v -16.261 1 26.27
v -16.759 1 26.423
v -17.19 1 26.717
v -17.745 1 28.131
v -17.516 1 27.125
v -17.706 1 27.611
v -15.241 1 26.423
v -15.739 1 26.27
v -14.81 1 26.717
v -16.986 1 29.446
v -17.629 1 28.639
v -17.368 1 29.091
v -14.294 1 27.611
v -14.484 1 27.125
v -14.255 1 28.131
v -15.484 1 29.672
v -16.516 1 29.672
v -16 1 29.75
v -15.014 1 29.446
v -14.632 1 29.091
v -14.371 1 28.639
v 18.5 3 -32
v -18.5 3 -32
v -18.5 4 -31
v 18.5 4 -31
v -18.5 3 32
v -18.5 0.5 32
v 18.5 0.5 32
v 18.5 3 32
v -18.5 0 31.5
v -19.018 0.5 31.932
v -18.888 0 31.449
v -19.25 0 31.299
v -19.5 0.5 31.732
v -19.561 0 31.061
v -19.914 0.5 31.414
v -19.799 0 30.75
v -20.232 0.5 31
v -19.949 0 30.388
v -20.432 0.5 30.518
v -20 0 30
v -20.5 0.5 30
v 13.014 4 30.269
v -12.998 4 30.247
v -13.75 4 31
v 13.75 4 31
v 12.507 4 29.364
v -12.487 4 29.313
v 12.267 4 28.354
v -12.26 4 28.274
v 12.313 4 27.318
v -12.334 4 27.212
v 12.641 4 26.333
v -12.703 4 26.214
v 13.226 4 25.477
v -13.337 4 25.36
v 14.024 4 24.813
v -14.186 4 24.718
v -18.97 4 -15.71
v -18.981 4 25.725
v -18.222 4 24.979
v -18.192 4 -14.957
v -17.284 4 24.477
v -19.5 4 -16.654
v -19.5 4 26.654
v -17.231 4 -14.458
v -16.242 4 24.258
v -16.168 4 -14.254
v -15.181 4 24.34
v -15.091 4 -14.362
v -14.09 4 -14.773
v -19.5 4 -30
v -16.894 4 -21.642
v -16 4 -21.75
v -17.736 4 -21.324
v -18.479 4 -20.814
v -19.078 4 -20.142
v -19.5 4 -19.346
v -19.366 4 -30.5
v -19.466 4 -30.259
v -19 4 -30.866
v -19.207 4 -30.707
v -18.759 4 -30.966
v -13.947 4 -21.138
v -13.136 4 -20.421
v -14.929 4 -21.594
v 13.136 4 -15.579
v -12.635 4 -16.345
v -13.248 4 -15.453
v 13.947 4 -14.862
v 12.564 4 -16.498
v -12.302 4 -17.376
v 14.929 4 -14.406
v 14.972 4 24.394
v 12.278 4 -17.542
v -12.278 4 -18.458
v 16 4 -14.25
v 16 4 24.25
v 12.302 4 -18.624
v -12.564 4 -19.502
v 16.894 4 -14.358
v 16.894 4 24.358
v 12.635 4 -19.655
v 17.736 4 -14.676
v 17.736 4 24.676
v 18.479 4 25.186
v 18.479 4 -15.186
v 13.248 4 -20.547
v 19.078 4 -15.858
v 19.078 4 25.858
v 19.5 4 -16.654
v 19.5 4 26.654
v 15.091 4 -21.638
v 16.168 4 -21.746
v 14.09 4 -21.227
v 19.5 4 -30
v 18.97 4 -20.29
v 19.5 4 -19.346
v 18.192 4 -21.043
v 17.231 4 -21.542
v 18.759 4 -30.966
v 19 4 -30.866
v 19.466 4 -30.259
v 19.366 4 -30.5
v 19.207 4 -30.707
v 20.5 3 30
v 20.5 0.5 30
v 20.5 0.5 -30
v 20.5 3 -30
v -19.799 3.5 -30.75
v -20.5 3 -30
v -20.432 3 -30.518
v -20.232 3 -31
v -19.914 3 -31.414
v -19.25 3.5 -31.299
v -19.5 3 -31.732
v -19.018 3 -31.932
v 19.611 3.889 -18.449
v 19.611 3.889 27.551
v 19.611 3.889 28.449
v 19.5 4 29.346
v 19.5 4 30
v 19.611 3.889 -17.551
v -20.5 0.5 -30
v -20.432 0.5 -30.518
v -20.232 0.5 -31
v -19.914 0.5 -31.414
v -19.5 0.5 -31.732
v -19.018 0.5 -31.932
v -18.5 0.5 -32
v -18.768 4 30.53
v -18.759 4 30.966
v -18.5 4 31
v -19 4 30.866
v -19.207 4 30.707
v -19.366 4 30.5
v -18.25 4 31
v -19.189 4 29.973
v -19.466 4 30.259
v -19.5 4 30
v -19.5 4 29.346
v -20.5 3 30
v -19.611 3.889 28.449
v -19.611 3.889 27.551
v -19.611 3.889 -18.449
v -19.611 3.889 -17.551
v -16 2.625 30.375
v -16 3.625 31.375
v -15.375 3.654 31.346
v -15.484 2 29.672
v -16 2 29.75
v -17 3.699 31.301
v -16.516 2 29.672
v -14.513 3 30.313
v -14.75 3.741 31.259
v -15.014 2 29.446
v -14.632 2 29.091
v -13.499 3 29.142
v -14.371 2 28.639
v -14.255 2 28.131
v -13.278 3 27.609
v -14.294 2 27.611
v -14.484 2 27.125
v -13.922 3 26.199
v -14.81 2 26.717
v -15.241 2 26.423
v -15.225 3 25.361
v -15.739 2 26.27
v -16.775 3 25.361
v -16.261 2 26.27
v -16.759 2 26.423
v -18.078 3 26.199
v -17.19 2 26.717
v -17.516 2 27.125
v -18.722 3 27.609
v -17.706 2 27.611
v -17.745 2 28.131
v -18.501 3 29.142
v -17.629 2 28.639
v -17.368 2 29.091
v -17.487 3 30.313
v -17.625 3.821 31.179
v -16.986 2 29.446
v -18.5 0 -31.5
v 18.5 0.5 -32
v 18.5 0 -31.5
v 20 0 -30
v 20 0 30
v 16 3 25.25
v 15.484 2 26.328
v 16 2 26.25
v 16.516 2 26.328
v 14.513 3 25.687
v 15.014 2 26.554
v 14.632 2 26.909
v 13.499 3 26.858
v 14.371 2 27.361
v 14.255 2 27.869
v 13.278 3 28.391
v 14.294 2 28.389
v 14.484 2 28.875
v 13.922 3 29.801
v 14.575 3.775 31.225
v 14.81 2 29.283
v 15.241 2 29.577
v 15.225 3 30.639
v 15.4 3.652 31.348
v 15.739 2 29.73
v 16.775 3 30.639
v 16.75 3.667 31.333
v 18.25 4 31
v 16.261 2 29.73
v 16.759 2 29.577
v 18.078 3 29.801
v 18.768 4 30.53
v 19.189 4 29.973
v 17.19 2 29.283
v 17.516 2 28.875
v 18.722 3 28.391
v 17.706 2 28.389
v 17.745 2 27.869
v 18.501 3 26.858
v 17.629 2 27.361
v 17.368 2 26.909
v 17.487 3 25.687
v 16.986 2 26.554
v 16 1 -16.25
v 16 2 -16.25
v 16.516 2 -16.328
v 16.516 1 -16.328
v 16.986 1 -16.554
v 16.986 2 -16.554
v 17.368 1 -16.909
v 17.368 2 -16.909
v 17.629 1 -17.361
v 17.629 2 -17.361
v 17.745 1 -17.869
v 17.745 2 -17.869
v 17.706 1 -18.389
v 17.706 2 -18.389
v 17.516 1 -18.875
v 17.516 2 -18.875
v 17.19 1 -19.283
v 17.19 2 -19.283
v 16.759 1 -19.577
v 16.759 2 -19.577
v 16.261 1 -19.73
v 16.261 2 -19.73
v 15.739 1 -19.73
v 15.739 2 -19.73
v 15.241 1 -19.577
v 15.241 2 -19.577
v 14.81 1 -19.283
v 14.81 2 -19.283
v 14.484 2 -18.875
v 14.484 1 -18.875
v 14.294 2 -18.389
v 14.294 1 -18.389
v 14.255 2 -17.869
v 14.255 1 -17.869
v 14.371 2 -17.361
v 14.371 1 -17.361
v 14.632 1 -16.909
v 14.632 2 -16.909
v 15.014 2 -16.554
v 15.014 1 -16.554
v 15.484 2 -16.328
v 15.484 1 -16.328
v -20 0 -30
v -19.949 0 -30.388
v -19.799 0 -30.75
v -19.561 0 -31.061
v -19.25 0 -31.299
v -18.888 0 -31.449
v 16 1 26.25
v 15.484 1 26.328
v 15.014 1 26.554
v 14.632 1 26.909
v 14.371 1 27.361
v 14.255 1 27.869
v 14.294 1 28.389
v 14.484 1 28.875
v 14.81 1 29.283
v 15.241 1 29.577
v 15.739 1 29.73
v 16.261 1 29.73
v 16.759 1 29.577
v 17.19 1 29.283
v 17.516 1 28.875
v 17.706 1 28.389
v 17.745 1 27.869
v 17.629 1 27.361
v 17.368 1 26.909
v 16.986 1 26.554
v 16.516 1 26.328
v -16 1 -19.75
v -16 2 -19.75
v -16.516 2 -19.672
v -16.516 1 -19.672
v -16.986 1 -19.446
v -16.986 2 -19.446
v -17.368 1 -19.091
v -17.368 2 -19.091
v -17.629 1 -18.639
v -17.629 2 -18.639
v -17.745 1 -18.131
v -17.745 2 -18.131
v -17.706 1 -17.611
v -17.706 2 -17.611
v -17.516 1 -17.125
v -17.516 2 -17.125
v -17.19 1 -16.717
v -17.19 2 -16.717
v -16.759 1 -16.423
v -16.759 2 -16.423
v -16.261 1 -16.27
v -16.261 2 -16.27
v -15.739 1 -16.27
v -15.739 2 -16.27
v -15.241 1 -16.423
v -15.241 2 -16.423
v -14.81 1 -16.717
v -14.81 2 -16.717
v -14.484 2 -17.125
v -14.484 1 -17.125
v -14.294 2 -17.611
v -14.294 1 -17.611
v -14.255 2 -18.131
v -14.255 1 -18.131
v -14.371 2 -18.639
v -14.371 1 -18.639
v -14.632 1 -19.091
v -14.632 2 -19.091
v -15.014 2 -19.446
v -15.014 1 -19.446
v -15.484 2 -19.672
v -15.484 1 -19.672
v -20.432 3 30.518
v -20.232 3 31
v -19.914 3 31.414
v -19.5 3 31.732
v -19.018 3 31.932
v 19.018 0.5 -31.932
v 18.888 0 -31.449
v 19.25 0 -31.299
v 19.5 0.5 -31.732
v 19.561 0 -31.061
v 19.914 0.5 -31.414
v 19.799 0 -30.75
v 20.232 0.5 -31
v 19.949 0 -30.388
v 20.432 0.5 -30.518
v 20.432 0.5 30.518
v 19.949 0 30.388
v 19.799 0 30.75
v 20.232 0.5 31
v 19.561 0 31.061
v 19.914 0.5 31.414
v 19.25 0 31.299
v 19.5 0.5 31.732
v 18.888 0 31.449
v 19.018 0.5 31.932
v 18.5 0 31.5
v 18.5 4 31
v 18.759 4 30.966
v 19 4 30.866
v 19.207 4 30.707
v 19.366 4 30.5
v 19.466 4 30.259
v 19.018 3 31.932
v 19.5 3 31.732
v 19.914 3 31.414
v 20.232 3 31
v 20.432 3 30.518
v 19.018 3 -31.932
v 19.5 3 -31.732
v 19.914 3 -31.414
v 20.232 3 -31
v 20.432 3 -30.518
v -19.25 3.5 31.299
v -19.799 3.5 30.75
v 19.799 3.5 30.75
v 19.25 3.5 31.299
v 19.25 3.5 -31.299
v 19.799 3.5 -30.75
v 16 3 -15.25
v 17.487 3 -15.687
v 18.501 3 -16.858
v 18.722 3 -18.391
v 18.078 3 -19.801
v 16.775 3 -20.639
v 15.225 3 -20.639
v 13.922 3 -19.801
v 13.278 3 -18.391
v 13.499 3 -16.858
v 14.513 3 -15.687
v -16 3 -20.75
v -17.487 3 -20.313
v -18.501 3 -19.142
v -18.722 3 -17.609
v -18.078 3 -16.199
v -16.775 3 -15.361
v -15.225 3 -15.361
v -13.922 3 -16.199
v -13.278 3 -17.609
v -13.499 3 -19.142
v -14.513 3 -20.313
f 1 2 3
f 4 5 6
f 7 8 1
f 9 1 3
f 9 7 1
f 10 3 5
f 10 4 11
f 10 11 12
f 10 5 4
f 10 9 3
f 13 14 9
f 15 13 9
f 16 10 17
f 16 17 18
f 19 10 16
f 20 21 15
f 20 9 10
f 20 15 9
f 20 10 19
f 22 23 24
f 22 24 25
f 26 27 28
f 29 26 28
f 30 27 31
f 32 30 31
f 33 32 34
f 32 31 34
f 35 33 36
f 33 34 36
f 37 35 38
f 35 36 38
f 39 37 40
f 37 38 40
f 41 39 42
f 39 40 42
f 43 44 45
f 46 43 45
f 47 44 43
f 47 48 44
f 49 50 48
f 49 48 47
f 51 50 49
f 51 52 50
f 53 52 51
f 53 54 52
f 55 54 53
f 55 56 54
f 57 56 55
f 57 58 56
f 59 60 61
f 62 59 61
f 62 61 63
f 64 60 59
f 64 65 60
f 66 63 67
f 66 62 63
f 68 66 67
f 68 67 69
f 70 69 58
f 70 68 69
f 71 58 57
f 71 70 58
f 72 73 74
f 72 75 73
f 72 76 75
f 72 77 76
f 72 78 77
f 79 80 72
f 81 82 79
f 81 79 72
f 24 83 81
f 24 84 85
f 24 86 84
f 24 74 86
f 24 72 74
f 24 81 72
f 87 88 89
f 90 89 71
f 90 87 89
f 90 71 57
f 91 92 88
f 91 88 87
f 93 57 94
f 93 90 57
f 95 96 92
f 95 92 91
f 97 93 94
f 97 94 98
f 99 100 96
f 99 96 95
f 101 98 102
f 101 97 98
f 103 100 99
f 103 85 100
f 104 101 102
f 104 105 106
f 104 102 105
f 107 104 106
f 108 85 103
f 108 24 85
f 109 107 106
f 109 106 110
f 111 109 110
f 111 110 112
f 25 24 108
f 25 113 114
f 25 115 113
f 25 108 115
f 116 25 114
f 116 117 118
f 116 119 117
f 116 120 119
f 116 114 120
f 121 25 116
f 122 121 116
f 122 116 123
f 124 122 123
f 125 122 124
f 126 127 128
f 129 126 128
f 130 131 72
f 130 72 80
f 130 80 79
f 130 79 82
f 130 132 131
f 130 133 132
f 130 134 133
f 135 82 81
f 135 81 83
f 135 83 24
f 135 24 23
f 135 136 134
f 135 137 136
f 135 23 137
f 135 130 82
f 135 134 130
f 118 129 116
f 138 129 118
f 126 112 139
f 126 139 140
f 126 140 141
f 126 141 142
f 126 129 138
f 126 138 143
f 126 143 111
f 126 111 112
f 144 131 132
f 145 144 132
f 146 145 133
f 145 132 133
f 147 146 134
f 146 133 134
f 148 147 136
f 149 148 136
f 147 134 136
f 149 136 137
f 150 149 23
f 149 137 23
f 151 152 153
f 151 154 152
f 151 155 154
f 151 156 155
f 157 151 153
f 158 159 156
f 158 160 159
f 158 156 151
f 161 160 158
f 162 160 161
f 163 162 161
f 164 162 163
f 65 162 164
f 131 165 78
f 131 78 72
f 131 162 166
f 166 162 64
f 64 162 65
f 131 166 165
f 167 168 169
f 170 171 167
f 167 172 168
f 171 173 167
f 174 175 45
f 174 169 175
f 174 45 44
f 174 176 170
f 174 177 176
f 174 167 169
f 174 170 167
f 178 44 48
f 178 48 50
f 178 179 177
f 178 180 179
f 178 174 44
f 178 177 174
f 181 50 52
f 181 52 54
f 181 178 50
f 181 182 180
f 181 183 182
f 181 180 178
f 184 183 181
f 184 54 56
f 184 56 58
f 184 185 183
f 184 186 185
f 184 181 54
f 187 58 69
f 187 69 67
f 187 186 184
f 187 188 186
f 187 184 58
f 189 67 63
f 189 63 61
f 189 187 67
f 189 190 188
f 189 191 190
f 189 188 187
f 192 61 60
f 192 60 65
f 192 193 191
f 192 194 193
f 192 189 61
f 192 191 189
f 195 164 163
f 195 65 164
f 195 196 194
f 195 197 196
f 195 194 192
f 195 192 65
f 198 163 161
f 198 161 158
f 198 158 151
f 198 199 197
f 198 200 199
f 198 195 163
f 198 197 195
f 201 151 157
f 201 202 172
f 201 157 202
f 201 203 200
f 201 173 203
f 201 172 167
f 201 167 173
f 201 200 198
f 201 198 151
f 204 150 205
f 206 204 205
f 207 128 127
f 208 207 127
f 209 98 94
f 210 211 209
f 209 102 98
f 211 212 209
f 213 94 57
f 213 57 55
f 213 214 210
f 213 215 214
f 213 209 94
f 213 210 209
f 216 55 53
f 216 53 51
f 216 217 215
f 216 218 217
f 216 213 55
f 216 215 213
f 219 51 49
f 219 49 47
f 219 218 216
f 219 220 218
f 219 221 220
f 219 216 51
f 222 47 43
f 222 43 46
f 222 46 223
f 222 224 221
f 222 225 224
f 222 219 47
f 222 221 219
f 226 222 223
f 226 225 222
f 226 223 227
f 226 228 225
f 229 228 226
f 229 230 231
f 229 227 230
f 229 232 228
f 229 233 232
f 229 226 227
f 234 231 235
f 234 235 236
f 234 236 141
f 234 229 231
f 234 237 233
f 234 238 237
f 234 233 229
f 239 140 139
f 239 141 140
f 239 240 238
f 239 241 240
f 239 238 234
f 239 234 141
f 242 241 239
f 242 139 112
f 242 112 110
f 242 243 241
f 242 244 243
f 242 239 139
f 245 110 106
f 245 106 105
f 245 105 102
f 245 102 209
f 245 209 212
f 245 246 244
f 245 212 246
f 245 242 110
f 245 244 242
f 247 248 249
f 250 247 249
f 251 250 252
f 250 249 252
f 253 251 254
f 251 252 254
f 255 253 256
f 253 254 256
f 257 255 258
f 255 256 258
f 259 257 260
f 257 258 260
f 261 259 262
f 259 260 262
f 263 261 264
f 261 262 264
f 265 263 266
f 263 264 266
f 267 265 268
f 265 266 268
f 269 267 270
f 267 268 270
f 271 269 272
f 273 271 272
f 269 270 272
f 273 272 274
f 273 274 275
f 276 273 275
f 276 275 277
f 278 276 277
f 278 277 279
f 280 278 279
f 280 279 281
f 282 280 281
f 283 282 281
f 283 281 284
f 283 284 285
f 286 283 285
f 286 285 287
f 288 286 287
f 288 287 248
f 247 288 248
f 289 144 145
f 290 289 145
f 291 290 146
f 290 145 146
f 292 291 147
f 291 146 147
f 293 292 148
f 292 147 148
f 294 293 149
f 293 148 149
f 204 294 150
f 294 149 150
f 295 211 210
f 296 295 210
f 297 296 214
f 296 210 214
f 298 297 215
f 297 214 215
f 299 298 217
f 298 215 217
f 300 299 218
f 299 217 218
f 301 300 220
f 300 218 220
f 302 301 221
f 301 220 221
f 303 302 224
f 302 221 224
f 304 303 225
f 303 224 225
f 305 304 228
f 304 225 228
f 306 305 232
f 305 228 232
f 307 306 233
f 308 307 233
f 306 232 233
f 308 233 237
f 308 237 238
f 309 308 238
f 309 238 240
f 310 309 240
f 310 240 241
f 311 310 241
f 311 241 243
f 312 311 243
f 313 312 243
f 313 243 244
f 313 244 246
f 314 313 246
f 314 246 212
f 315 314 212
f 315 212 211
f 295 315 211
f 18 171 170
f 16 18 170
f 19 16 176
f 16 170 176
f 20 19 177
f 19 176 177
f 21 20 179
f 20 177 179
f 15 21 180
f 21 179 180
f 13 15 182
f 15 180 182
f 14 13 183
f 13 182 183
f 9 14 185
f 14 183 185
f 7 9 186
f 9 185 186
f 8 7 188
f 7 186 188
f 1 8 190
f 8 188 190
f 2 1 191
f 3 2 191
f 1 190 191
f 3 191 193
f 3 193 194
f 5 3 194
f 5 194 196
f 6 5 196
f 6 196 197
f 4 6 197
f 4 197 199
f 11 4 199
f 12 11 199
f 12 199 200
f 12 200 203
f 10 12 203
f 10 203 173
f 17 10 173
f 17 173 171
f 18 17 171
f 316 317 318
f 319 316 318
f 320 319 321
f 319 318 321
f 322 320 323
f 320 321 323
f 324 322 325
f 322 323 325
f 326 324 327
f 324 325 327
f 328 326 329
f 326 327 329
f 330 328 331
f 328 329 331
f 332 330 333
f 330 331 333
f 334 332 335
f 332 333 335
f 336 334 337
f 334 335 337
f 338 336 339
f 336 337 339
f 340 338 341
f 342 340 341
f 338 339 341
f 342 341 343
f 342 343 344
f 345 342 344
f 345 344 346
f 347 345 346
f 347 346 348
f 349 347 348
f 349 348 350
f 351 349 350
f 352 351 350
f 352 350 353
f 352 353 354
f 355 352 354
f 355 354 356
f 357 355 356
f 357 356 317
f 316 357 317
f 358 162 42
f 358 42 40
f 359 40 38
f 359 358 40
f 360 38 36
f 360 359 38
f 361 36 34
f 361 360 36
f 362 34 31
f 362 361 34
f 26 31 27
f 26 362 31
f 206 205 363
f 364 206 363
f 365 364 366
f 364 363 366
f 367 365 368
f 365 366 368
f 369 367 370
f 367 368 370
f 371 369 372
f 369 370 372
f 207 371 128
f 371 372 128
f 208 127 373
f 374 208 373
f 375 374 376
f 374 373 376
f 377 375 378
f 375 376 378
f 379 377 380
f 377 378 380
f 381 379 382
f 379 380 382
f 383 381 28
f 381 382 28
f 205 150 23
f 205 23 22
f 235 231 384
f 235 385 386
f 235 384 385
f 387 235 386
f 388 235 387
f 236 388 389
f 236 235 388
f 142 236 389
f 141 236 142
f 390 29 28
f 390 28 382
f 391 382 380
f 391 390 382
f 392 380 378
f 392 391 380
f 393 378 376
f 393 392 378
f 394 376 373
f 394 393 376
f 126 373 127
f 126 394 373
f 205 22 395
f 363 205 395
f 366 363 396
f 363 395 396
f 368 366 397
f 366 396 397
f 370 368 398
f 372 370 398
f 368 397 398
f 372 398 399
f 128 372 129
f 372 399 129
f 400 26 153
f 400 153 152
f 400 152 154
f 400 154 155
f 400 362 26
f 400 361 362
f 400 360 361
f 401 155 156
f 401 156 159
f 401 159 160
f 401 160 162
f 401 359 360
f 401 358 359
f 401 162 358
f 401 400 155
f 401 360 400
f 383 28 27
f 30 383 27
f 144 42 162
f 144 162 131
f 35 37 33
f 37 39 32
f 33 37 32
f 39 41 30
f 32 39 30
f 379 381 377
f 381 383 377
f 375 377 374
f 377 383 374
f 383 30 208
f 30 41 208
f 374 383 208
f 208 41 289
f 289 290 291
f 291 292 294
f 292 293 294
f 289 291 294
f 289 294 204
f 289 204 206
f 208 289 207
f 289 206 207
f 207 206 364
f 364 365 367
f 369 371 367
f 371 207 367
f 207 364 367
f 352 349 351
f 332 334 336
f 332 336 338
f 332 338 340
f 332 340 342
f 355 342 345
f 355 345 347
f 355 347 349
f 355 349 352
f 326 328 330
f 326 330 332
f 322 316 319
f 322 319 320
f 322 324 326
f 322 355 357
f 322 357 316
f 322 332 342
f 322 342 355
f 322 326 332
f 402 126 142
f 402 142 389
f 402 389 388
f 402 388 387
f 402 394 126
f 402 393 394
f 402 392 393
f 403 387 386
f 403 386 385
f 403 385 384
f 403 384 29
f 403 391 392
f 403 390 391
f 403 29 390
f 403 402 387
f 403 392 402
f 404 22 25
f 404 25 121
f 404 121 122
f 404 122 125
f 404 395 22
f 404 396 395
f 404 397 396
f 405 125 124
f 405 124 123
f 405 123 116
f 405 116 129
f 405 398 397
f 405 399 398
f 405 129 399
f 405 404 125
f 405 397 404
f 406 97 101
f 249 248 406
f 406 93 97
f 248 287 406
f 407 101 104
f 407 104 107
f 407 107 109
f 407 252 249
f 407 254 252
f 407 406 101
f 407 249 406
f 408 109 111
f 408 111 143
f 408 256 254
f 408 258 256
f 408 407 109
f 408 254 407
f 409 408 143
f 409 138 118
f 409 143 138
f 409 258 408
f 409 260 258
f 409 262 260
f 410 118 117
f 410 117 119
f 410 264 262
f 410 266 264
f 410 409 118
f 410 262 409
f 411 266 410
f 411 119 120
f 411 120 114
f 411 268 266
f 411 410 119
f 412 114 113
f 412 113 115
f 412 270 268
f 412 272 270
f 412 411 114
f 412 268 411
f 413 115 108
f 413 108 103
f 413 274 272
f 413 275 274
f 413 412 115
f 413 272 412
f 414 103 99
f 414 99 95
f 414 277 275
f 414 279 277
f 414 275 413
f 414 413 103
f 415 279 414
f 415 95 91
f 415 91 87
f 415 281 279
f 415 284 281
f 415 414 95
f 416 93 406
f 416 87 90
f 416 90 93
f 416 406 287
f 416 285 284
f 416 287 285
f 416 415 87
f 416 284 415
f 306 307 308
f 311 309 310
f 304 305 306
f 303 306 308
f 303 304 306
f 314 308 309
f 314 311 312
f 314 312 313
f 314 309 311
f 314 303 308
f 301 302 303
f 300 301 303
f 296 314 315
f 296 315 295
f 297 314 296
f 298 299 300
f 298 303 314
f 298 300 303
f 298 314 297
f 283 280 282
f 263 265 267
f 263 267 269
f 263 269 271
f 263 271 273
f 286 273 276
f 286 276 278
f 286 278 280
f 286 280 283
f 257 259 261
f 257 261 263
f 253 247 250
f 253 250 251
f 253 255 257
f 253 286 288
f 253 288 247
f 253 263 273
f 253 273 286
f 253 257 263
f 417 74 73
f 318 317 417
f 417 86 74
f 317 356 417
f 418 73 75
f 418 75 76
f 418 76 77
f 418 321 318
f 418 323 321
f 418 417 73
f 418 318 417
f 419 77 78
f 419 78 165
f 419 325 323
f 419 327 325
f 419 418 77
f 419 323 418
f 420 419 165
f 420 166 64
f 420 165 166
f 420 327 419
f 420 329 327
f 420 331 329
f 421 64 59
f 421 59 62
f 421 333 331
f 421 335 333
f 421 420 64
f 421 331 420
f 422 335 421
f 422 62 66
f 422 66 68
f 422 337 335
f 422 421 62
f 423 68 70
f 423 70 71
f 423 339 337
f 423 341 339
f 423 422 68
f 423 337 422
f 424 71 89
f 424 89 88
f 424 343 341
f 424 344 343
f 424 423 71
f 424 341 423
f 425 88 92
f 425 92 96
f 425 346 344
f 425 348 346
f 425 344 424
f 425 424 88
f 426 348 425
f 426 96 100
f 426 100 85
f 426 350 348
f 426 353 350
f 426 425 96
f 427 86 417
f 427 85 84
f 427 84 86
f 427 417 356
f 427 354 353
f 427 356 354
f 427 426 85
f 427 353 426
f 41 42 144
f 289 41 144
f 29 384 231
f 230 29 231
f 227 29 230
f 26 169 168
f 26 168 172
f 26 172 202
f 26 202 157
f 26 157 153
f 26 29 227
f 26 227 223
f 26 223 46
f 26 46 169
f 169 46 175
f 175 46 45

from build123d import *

# Parameters (mm, degrees)
SKETCH_1_W          = 41
SKETCH_1_H          = 64
EXTRUDE_1_DEPTH     = 4
SKETCH_2_R          = 1.75
CUT_EXTRUDE_1_DEPTH = 3
FILLET_1_R          = 2
CHAMFER_2_SIZE      = 1
CHAMFER_1_SIZE      = 2
CHAMFER_3_SIZE      = 0.5


with BuildPart() as part:
    # Эскиз1 → Бобышка-Вытянуть1 (new body)
    with BuildSketch(Plane(origin=(0, 0, 0), x_dir=(1, 0, 0), z_dir=(0, 1, 0))):
        Rectangle(SKETCH_1_W, SKETCH_1_H)
    extrude(amount=EXTRUDE_1_DEPTH)

    # Эскиз2 → Вырез-Вытянуть1 (cut)
    with BuildSketch(Plane(origin=(0, 4, 0), x_dir=(1, 0, 0), z_dir=(0, 1, 0))):
        with Locations(Location((16, 18, 0), (0, 0, 270))):
            Circle(SKETCH_2_R)
        with Locations(Location((16, -28, 0), (0, 0, 90))):
            Circle(SKETCH_2_R)
        with Locations(Location((-16, 18, 0), (0, 0, 90))):
            Circle(SKETCH_2_R)
        with Locations(Location((-16, -28, 0), (0, 0, 270))):
            Circle(SKETCH_2_R)
    extrude(amount=-CUT_EXTRUDE_1_DEPTH, mode=Mode.SUBTRACT)

    # Скругление1
    fillet_1_edges = [part.edges().sort_by_distance(p)[0] for p in [
        (20.5, 2, 32),
        (-20.5, 2, 32),
        (-20.5, 2, -32),
        (20.5, 2, -32),
    ]]
    fillet(fillet_1_edges, radius=FILLET_1_R)

    # Фаска2
    chamfer_2_edges = [part.edges().sort_by_distance(p)[0] for p in [
        (0, 4, -32),
        (20.5, 4, 0),
        (-20.5, 4, 0),
        (0, 4, 32),
        (19.914213562, 4, 31.414213562),
        (-19.914213562, 4, 31.414213562),
        (-19.914213562, 4, -31.414213562),
        (19.914213562, 4, -31.414213562),
    ]]
    chamfer(chamfer_2_edges, length=CHAMFER_2_SIZE)

    # Фаска1
    # the kernel refuses this chamfer: 2 mm, written as the material it takes off along each edge
    with BuildSketch(Plane(origin=(-16, 4, -18), x_dir=(0, 0, -1), z_dir=(1, 0, 0))) as chamfer_1_piece_1:
        Polygon((1.75 + CHAMFER_1_SIZE, 0), (1.75, -CHAMFER_1_SIZE), (1.75, 0), align=None)
    revolve(axis=Axis((-16, 4, -18), (0, 1, 0)), mode=Mode.SUBTRACT)
    with BuildSketch(Plane(origin=(-16, 4, 28), x_dir=(0, 0, 1), z_dir=(-1, 0, 0))) as chamfer_1_piece_2:
        Polygon((1.75 + CHAMFER_1_SIZE, 0), (1.75, -CHAMFER_1_SIZE), (1.75, 0), align=None)
    revolve(axis=Axis((-16, 4, 28), (0, 1, 0)), mode=Mode.SUBTRACT)
    with BuildSketch(Plane(origin=(16, 4, 28), x_dir=(0, 0, -1), z_dir=(1, 0, 0))) as chamfer_1_piece_3:
        Polygon((1.75 + CHAMFER_1_SIZE, 0), (1.75, -CHAMFER_1_SIZE), (1.75, 0), align=None)
    revolve(axis=Axis((16, 4, 28), (0, 1, 0)), mode=Mode.SUBTRACT)
    with BuildSketch(Plane(origin=(16, 4, -18), x_dir=(0, 0, 1), z_dir=(-1, 0, 0))) as chamfer_1_piece_4:
        Polygon((1.75 + CHAMFER_1_SIZE, 0), (1.75, -CHAMFER_1_SIZE), (1.75, 0), align=None)
    revolve(axis=Axis((16, 4, -18), (0, 1, 0)), mode=Mode.SUBTRACT)

    # Фаска3
    chamfer_3_edges = [part.edges().sort_by_distance(p)[0] for p in [
        (0, 0, -32),
        (20.5, 0, 0),
        (0, 0, 32),
        (-20.5, 0, 0),
        (19.914213562, 0, 31.414213562),
        (-19.914213562, 0, 31.414213562),
        (-19.914213562, 0, -31.414213562),
        (19.914213562, 0, -31.414213562),
    ]]
    chamfer(chamfer_3_edges, length=CHAMFER_3_SIZE)


solid = part.part
